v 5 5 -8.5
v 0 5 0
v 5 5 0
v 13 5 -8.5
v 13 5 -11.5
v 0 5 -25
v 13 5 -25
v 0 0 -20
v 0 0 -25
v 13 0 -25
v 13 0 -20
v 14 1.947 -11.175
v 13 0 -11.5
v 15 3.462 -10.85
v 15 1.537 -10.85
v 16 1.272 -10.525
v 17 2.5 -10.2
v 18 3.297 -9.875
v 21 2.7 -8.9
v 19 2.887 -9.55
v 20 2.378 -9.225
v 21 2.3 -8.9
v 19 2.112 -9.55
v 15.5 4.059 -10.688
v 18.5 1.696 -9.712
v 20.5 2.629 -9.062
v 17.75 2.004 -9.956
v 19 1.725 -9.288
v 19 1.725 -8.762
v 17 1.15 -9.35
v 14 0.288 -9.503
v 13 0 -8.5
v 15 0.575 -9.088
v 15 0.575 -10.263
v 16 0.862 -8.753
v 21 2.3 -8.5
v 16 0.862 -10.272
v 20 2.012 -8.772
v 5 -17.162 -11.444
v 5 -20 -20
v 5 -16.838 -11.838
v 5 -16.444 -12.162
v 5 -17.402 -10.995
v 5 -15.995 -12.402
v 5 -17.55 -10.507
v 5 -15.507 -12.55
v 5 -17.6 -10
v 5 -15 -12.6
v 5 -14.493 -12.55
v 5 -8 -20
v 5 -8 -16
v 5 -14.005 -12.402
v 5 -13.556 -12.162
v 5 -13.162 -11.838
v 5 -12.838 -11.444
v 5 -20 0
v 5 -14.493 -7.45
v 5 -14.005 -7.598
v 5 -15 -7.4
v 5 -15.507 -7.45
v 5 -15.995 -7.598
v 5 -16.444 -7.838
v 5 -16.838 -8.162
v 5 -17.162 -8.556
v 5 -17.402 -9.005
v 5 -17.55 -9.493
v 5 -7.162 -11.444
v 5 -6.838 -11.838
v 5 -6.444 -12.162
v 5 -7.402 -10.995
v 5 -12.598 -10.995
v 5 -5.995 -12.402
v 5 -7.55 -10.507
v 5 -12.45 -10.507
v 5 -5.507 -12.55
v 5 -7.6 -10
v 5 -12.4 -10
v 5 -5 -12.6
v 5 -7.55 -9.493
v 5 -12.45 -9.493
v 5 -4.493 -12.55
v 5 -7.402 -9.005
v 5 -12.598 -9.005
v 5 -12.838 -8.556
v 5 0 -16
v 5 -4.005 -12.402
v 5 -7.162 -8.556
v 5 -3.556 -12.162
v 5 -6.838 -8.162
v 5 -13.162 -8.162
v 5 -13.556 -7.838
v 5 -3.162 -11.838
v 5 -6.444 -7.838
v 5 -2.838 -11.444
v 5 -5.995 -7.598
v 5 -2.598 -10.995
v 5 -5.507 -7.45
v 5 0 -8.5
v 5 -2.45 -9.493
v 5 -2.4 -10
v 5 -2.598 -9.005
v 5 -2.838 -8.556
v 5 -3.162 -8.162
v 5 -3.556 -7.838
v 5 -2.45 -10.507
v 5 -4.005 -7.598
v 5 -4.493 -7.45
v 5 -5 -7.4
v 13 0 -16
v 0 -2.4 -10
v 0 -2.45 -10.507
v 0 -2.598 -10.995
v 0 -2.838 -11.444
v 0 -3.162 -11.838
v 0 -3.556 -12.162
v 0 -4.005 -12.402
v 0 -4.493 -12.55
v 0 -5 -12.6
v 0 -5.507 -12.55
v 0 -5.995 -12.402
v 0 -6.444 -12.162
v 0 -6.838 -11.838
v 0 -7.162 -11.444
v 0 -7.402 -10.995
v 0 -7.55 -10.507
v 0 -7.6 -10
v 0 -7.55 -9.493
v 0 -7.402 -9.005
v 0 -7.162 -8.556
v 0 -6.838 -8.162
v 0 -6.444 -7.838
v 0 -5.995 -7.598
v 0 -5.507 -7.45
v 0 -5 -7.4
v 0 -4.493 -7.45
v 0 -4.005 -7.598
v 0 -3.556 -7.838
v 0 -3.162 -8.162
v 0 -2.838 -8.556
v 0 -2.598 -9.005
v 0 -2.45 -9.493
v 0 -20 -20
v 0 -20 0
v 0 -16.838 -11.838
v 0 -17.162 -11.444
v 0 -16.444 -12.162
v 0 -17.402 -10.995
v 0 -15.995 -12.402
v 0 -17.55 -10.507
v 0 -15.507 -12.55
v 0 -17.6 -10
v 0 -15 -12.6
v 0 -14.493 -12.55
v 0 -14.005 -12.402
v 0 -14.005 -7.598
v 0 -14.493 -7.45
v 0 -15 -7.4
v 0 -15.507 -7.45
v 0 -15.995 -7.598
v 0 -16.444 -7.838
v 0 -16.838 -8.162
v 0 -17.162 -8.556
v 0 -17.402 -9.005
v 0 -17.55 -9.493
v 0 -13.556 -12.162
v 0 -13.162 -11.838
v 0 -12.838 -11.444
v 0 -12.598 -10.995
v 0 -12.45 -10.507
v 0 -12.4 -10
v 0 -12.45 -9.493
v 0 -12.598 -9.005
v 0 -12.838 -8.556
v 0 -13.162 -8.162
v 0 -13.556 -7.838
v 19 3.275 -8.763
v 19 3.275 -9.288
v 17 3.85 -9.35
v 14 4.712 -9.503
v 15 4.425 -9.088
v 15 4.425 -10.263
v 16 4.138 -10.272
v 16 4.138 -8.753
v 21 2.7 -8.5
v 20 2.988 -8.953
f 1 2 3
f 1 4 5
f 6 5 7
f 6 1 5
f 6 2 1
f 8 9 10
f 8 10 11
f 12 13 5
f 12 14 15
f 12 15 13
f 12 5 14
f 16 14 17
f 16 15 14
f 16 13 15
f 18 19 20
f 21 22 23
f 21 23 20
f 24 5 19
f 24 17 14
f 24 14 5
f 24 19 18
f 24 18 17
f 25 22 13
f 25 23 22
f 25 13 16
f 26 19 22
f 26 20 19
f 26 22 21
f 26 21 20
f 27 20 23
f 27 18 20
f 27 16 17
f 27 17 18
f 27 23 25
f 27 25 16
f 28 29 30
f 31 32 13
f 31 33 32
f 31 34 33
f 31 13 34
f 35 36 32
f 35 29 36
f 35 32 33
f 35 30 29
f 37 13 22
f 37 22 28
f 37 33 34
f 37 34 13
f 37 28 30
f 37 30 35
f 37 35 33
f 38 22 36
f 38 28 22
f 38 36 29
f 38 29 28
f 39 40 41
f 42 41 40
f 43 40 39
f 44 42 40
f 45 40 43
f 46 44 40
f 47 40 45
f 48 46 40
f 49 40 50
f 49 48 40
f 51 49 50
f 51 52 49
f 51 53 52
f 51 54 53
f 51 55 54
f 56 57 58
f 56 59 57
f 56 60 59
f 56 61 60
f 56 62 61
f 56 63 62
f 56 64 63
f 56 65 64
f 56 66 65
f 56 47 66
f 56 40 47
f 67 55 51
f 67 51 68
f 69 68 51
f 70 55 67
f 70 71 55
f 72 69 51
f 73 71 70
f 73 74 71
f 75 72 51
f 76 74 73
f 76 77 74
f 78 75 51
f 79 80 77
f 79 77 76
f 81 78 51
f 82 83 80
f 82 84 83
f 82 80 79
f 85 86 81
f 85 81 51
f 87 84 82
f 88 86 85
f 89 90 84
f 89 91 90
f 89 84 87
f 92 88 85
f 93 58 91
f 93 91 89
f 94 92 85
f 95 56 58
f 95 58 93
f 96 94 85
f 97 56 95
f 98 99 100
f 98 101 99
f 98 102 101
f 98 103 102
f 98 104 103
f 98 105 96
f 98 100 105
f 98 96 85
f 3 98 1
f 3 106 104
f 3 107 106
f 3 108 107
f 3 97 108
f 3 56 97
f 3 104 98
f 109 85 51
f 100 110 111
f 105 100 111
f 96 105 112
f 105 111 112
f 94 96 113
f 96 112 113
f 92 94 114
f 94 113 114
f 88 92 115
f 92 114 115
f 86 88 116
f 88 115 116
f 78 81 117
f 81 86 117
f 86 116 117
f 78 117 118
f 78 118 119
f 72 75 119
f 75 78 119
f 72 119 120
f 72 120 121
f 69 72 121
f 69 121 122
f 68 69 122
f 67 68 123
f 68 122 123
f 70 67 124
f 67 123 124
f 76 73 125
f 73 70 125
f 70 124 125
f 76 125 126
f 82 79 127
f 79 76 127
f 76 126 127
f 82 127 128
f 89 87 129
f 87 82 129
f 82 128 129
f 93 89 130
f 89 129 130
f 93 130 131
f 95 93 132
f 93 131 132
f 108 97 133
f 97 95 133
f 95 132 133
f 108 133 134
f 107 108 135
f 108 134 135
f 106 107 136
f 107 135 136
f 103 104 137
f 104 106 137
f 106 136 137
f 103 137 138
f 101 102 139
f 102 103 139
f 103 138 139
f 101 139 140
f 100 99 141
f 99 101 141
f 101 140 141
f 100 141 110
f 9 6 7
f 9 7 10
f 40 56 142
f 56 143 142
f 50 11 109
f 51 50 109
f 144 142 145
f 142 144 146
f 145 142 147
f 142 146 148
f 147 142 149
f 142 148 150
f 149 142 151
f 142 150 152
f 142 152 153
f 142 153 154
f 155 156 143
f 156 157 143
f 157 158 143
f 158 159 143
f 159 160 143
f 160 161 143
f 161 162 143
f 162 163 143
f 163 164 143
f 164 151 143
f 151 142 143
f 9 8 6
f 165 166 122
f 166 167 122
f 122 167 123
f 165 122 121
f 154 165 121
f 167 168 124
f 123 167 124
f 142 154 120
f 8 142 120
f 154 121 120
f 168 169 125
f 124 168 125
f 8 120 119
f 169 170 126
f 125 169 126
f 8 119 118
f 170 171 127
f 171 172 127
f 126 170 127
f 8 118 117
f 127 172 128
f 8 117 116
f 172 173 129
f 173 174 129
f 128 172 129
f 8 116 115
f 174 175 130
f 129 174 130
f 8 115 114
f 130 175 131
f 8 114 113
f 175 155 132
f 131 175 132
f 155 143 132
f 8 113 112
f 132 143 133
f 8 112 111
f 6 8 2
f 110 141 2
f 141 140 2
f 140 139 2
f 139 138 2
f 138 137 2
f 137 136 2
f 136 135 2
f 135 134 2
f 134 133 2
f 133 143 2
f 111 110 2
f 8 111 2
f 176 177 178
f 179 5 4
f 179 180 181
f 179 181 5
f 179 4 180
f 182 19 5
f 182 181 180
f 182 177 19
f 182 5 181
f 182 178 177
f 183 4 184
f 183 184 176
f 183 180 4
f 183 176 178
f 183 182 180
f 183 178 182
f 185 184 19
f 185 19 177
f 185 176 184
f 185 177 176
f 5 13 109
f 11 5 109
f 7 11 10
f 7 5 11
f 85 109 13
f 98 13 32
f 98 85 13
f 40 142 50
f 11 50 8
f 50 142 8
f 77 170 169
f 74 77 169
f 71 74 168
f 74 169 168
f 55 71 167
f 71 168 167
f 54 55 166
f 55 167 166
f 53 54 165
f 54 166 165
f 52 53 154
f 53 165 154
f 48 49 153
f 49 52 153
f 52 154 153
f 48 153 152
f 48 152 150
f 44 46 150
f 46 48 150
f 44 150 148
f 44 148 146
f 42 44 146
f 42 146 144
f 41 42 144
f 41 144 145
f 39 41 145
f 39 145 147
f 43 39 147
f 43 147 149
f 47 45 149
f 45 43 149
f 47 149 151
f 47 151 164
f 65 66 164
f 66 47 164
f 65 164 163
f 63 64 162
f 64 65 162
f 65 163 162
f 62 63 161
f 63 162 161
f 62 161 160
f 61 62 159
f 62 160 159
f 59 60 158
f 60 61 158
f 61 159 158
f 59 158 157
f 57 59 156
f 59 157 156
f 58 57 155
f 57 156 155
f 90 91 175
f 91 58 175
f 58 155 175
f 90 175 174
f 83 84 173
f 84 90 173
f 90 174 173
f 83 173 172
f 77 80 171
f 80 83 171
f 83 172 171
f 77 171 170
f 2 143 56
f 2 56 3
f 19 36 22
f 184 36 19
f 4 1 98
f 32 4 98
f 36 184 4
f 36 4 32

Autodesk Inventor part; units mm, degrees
ref_plane "YZ Plane" through (0, 0, 0) normal (1, 0, 0) x (0, 1, 0)
ref_plane "XZ Plane" through (0, 0, 0) normal (0, 1, 0) x (-1, 0, 0)
sketch "Sketch1" plane through (0, 0, 0) normal (1, 0, 0) x (0, 1, 0)
  line L0 (0, 0) -> (5, 0)
  line L1 (5, 0) -> (5, -25)
  line L2 (5, -25) -> (0, -25)
  line L3 (0, -25) -> (0, 0)
  line L4 (0, 0) -> (-20, 0)
  line L5 (-20, 0) -> (-20, -20)
  line L6 (-20, -20) -> (0, -20)
  line L7 (0, -20) -> (0, 0)
  line L8 (-20, -10) -> (0, -10) construction
  circle A0 centre (-5, -10) radius 2.6
  circle A1 centre (-15, -10) radius 2.6
  dimension "d0" = 5
  dimension "d1" = 25
  dimension "d2" = 20
  dimension "d3" = 20
  dimension "d4" = 5.2
  dimension "d5" = 5.2
  dimension "d6" = 5
  dimension "d7" = 5
extrude "Extrusion1" add sketch "Sketch1" along normal blind 5
sketch "Sketch2" plane through (5, 0, 0) normal (1, 0, 0) x (0, 0, -1)
  line L0 (20, 0) -> (25, 0) projected
  line L1 (25, 5) -> (0, 5) projected
  line L2 (25, 0) -> (0, 0)
  line L3 (0, 0) -> (0, 5)
  line L4 (0, 5) -> (25, 5)
  line L5 (25, 5) -> (25, 0)
  line L6 (0, 0) -> (4, 0)
  line L7 (4, 0) -> (4, -8)
  line L8 (4, -8) -> (0, -8)
  line L9 (0, -8) -> (0, 0)
  line L10 (20, -20) -> (20, 0) projected
  line L11 (20, 0) -> (16, 0)
  line L12 (16, 0) -> (16, -8)
  line L13 (16, -8) -> (20, -8)
  line L14 (20, -8) -> (20, 0)
  line L15 (8.5, 0) -> (8.5, 5)
  point P0 (8.5, 5)
  dimension "d12" = 4
  dimension "d13" = 8
  dimension "d14" = 4
  dimension "d15" = 8
  dimension "d19" = 8.5
extrude "Extrusion2" add sketch "Sketch2" along normal blind 8 contours L2 L15 L1 L5 L0 | L10 L13 L12 L2
chamfer "Chamfer1" distance 8 angle 45 1 edges at (13, -8, -18)
sketch "Sketch3" plane through (13, 0, 0) normal (1, 0, 0) x (0, 0, -1)
  line L0 (8.5, 0) -> (8.5, 5) projected
  line L1 (16, 0) -> (8.5, 0) projected
  line L2 (8.5, 5) -> (8.5, 0)
  line L3 (8.5, 0) -> (11.5, 0)
  line L4 (11.5, 0) -> (11.5, 5)
  line L5 (25, 5) -> (0, 5) projected
  line L6 (11.5, 5) -> (8.5, 5)
  point P0 (0, 0)
  dimension "d20" = 3
ref_plane "Work Plane1" through (21, 0, 0) normal (1, 0, 0) x (0, 0, -1)
sketch "Sketch4" plane through (21, 0, 0) normal (1, 0, 0) x (0, 0, -1)
  line L0 (8.5, 0) -> (8.5, 5) construction
  line L1 (8.5, 2.5) -> (11.5, 2.5) construction
  line L2 (25, 5) -> (0, 5) construction
  line L3 (8.5, 2.7) -> (8.9, 2.7)
  line L4 (8.9, 2.7) -> (8.9, 2.3)
  line L5 (8.9, 2.3) -> (8.5, 2.3)
  line L6 (8.5, 2.3) -> (8.5, 2.7)
  point P0 (0, 0)
  dimension "d22" = 3
  dimension "d23" = 0.2
  dimension "d24" = 0.2
  dimension "d25" = 0.4
loft "Loft1" add profiles "Sketch3", "Sketch4"
equation "\"d7\" = d6"
equation "\"d24\" = d23"
properties part number "Z Axis Limt Adjustable Trigger"
